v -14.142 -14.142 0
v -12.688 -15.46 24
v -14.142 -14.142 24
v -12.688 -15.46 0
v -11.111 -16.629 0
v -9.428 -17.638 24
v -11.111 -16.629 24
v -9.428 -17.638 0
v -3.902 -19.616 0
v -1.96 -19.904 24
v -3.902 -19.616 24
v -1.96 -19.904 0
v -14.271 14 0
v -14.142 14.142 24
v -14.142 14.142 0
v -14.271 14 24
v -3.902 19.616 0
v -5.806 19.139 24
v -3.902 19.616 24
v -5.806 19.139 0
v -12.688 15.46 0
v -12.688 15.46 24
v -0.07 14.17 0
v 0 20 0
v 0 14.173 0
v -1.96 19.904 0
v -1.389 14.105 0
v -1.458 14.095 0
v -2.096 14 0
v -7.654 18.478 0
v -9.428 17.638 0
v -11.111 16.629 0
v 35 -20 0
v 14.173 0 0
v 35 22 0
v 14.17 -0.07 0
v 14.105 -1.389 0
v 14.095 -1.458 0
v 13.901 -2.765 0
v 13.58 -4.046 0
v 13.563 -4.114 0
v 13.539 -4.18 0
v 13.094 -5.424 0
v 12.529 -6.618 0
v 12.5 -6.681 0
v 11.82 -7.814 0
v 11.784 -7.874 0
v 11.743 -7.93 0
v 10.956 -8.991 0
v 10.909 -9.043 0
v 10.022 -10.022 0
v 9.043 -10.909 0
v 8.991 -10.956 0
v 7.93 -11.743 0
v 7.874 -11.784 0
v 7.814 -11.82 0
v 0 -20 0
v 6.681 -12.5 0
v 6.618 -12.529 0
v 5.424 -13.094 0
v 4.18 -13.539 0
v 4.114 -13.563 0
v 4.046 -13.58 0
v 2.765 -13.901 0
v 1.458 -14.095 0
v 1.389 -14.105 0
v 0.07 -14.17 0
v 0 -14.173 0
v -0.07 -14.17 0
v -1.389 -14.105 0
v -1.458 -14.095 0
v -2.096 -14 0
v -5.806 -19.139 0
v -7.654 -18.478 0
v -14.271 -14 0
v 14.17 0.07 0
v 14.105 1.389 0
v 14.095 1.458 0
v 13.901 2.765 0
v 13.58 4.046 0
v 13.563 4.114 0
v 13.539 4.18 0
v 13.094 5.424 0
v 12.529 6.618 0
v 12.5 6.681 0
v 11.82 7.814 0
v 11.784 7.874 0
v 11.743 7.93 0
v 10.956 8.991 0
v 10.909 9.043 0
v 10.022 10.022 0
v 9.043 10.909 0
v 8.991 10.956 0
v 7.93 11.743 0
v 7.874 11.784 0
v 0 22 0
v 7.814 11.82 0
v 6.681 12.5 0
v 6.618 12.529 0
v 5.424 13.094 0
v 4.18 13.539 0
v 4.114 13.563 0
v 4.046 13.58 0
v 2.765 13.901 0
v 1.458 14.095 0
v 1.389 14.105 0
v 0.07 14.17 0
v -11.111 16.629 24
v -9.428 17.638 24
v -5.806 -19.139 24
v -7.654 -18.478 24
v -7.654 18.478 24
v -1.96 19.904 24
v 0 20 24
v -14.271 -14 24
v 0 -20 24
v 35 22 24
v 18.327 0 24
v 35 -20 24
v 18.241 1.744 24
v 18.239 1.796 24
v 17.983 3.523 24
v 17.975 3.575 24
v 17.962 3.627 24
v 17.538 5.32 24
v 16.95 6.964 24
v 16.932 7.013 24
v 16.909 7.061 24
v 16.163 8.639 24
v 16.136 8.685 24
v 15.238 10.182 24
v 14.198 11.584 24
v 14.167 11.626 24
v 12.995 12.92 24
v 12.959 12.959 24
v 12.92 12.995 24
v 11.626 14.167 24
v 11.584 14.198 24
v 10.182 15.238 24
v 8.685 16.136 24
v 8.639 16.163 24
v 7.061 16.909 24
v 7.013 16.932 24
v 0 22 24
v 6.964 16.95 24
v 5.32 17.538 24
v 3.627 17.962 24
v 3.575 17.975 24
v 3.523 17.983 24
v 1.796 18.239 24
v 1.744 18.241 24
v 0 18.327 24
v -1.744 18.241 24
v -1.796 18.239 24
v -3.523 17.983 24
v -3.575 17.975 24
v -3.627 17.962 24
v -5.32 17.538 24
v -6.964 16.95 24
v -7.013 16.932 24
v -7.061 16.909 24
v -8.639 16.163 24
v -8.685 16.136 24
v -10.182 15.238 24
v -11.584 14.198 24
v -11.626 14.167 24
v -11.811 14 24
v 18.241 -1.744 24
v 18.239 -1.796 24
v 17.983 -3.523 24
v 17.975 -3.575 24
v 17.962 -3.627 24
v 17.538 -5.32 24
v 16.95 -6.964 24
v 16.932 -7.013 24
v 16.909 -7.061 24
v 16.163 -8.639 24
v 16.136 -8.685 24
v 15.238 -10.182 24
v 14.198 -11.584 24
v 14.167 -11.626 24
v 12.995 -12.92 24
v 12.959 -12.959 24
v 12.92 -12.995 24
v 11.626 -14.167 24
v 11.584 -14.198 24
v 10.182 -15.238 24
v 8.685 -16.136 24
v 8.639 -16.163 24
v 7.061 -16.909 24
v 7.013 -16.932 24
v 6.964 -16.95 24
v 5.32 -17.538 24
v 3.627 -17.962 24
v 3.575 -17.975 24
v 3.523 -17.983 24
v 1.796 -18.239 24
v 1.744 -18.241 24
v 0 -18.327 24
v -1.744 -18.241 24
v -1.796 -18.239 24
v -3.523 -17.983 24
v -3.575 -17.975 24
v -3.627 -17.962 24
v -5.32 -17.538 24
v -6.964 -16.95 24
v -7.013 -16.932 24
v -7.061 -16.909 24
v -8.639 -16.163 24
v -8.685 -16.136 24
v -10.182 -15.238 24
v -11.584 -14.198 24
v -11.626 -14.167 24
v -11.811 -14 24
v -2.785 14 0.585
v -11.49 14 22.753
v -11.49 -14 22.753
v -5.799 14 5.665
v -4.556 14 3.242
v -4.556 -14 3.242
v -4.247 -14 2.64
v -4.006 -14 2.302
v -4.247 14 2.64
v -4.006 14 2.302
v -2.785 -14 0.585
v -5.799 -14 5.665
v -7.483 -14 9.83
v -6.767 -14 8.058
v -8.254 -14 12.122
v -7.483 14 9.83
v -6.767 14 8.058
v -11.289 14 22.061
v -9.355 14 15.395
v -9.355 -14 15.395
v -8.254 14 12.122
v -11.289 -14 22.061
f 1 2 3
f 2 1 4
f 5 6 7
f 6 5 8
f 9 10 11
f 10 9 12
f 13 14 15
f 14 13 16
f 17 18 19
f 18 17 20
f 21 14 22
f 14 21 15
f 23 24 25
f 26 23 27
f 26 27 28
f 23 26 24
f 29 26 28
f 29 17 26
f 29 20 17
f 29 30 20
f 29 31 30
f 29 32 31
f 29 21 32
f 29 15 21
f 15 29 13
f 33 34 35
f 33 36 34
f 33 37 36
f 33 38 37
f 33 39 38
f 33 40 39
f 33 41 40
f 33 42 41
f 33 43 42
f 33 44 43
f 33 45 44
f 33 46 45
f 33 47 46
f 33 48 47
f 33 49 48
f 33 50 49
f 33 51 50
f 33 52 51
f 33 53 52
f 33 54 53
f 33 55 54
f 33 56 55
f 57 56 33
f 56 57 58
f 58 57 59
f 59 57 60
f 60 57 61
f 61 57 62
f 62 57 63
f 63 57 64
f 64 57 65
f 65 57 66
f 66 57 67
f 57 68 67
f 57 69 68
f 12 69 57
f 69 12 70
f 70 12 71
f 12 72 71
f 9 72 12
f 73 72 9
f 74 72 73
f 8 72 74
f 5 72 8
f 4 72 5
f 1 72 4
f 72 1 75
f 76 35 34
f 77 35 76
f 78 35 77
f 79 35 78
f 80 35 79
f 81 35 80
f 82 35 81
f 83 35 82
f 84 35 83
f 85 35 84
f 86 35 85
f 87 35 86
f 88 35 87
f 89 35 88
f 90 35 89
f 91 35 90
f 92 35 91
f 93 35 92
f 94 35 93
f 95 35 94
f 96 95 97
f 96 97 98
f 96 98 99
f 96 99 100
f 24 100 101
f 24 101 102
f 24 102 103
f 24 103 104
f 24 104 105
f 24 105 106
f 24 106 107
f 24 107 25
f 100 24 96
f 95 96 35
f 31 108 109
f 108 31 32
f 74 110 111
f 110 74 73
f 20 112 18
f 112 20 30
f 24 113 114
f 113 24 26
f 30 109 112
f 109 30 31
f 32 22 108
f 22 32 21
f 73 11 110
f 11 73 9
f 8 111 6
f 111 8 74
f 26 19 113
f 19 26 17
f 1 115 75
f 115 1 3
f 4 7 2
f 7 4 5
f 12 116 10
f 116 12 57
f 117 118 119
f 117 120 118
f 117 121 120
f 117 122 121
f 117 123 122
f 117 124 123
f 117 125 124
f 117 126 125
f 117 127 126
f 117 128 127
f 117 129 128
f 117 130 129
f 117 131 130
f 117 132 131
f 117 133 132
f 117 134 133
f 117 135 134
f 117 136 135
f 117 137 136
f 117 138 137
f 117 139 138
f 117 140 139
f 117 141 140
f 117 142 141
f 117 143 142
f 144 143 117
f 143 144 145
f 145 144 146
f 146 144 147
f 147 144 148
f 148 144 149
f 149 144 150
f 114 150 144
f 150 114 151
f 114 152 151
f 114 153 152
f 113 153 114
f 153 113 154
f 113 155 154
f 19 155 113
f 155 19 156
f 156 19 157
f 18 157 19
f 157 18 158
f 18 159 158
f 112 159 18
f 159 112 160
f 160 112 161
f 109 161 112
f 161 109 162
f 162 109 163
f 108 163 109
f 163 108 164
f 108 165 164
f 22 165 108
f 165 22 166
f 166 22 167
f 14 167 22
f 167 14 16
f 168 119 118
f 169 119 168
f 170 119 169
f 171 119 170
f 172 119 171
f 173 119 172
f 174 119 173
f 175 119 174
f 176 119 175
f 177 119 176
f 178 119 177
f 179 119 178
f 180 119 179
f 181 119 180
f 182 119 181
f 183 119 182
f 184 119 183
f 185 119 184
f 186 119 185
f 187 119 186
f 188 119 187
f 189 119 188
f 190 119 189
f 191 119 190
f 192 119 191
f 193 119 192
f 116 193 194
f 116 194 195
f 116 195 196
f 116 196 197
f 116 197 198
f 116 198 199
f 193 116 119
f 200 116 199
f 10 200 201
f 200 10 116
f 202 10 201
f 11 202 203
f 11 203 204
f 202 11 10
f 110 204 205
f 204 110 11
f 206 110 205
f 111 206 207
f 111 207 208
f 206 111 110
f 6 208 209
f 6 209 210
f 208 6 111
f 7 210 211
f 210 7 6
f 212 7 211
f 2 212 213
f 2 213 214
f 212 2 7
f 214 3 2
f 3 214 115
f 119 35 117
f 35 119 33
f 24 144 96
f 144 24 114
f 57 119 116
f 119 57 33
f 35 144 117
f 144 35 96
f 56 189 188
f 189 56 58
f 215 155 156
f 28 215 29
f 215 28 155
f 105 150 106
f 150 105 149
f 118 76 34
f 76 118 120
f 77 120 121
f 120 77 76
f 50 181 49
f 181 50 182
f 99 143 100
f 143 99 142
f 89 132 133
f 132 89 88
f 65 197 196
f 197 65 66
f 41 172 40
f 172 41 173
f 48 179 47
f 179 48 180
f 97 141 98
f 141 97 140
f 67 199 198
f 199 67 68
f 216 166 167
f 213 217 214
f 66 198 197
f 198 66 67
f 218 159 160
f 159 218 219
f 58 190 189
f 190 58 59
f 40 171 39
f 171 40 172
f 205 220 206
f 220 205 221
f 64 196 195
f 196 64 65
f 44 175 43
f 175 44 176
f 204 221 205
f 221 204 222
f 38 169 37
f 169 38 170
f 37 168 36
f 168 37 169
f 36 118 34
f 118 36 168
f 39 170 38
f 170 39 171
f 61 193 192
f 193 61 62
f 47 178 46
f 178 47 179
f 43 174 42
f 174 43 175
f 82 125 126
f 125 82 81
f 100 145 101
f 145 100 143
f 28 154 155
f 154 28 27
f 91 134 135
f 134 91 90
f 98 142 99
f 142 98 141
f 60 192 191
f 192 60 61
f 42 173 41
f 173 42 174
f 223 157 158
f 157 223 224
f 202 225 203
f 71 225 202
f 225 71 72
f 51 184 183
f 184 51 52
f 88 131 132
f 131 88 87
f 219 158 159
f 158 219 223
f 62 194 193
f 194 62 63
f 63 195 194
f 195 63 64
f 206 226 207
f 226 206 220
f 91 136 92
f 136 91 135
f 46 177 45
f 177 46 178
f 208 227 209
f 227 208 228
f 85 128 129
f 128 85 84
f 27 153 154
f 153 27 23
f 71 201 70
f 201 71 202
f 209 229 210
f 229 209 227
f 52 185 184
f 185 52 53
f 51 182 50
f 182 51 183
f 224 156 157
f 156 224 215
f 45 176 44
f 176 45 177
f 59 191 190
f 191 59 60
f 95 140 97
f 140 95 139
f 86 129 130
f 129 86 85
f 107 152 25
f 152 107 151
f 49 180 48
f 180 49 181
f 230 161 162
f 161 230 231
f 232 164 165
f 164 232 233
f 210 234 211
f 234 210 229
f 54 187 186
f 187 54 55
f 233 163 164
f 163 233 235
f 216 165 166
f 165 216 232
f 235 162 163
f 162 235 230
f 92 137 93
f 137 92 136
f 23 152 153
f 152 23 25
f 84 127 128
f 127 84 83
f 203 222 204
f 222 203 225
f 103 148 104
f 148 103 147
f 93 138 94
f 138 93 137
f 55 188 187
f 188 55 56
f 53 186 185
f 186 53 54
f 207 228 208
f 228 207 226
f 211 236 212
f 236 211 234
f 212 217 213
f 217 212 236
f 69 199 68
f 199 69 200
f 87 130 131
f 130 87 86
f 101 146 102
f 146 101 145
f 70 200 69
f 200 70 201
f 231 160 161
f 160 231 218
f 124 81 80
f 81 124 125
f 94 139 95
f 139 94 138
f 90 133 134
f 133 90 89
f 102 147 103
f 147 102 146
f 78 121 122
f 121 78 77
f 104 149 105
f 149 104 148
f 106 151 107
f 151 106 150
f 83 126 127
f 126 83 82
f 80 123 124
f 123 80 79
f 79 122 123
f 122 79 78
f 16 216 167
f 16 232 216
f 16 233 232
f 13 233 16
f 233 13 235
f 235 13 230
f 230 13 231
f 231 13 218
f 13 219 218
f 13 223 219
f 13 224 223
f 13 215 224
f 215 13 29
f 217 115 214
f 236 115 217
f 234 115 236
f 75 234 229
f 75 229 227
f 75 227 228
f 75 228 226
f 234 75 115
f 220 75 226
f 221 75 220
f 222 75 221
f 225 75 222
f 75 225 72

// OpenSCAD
glue_base = 35;
box_size = 102;

diameter = 28;
height = 24;
depth = 15;
wall = 6;
opening = 28;

$fn = 64;

outer_diameter = diameter + 2 * wall;

difference() {
    // Basic shape
    union() {
        cylinder(d = outer_diameter, h = height);
        translate([0, -outer_diameter / 2]) cube([outer_diameter / 2 + depth, outer_diameter, height]);
        translate([0,10,0]) cube([35,12,height]); 
    }

    // Flashlight hole
    translate([0, 0, -1]) cylinder(d1 = diameter, d2 = diameter + wall * 1.5, h = height + 2);
    translate([-outer_diameter / 2, -opening / 2, -1]) cube([outer_diameter / 2 + 1, opening, height + 2]);
}
